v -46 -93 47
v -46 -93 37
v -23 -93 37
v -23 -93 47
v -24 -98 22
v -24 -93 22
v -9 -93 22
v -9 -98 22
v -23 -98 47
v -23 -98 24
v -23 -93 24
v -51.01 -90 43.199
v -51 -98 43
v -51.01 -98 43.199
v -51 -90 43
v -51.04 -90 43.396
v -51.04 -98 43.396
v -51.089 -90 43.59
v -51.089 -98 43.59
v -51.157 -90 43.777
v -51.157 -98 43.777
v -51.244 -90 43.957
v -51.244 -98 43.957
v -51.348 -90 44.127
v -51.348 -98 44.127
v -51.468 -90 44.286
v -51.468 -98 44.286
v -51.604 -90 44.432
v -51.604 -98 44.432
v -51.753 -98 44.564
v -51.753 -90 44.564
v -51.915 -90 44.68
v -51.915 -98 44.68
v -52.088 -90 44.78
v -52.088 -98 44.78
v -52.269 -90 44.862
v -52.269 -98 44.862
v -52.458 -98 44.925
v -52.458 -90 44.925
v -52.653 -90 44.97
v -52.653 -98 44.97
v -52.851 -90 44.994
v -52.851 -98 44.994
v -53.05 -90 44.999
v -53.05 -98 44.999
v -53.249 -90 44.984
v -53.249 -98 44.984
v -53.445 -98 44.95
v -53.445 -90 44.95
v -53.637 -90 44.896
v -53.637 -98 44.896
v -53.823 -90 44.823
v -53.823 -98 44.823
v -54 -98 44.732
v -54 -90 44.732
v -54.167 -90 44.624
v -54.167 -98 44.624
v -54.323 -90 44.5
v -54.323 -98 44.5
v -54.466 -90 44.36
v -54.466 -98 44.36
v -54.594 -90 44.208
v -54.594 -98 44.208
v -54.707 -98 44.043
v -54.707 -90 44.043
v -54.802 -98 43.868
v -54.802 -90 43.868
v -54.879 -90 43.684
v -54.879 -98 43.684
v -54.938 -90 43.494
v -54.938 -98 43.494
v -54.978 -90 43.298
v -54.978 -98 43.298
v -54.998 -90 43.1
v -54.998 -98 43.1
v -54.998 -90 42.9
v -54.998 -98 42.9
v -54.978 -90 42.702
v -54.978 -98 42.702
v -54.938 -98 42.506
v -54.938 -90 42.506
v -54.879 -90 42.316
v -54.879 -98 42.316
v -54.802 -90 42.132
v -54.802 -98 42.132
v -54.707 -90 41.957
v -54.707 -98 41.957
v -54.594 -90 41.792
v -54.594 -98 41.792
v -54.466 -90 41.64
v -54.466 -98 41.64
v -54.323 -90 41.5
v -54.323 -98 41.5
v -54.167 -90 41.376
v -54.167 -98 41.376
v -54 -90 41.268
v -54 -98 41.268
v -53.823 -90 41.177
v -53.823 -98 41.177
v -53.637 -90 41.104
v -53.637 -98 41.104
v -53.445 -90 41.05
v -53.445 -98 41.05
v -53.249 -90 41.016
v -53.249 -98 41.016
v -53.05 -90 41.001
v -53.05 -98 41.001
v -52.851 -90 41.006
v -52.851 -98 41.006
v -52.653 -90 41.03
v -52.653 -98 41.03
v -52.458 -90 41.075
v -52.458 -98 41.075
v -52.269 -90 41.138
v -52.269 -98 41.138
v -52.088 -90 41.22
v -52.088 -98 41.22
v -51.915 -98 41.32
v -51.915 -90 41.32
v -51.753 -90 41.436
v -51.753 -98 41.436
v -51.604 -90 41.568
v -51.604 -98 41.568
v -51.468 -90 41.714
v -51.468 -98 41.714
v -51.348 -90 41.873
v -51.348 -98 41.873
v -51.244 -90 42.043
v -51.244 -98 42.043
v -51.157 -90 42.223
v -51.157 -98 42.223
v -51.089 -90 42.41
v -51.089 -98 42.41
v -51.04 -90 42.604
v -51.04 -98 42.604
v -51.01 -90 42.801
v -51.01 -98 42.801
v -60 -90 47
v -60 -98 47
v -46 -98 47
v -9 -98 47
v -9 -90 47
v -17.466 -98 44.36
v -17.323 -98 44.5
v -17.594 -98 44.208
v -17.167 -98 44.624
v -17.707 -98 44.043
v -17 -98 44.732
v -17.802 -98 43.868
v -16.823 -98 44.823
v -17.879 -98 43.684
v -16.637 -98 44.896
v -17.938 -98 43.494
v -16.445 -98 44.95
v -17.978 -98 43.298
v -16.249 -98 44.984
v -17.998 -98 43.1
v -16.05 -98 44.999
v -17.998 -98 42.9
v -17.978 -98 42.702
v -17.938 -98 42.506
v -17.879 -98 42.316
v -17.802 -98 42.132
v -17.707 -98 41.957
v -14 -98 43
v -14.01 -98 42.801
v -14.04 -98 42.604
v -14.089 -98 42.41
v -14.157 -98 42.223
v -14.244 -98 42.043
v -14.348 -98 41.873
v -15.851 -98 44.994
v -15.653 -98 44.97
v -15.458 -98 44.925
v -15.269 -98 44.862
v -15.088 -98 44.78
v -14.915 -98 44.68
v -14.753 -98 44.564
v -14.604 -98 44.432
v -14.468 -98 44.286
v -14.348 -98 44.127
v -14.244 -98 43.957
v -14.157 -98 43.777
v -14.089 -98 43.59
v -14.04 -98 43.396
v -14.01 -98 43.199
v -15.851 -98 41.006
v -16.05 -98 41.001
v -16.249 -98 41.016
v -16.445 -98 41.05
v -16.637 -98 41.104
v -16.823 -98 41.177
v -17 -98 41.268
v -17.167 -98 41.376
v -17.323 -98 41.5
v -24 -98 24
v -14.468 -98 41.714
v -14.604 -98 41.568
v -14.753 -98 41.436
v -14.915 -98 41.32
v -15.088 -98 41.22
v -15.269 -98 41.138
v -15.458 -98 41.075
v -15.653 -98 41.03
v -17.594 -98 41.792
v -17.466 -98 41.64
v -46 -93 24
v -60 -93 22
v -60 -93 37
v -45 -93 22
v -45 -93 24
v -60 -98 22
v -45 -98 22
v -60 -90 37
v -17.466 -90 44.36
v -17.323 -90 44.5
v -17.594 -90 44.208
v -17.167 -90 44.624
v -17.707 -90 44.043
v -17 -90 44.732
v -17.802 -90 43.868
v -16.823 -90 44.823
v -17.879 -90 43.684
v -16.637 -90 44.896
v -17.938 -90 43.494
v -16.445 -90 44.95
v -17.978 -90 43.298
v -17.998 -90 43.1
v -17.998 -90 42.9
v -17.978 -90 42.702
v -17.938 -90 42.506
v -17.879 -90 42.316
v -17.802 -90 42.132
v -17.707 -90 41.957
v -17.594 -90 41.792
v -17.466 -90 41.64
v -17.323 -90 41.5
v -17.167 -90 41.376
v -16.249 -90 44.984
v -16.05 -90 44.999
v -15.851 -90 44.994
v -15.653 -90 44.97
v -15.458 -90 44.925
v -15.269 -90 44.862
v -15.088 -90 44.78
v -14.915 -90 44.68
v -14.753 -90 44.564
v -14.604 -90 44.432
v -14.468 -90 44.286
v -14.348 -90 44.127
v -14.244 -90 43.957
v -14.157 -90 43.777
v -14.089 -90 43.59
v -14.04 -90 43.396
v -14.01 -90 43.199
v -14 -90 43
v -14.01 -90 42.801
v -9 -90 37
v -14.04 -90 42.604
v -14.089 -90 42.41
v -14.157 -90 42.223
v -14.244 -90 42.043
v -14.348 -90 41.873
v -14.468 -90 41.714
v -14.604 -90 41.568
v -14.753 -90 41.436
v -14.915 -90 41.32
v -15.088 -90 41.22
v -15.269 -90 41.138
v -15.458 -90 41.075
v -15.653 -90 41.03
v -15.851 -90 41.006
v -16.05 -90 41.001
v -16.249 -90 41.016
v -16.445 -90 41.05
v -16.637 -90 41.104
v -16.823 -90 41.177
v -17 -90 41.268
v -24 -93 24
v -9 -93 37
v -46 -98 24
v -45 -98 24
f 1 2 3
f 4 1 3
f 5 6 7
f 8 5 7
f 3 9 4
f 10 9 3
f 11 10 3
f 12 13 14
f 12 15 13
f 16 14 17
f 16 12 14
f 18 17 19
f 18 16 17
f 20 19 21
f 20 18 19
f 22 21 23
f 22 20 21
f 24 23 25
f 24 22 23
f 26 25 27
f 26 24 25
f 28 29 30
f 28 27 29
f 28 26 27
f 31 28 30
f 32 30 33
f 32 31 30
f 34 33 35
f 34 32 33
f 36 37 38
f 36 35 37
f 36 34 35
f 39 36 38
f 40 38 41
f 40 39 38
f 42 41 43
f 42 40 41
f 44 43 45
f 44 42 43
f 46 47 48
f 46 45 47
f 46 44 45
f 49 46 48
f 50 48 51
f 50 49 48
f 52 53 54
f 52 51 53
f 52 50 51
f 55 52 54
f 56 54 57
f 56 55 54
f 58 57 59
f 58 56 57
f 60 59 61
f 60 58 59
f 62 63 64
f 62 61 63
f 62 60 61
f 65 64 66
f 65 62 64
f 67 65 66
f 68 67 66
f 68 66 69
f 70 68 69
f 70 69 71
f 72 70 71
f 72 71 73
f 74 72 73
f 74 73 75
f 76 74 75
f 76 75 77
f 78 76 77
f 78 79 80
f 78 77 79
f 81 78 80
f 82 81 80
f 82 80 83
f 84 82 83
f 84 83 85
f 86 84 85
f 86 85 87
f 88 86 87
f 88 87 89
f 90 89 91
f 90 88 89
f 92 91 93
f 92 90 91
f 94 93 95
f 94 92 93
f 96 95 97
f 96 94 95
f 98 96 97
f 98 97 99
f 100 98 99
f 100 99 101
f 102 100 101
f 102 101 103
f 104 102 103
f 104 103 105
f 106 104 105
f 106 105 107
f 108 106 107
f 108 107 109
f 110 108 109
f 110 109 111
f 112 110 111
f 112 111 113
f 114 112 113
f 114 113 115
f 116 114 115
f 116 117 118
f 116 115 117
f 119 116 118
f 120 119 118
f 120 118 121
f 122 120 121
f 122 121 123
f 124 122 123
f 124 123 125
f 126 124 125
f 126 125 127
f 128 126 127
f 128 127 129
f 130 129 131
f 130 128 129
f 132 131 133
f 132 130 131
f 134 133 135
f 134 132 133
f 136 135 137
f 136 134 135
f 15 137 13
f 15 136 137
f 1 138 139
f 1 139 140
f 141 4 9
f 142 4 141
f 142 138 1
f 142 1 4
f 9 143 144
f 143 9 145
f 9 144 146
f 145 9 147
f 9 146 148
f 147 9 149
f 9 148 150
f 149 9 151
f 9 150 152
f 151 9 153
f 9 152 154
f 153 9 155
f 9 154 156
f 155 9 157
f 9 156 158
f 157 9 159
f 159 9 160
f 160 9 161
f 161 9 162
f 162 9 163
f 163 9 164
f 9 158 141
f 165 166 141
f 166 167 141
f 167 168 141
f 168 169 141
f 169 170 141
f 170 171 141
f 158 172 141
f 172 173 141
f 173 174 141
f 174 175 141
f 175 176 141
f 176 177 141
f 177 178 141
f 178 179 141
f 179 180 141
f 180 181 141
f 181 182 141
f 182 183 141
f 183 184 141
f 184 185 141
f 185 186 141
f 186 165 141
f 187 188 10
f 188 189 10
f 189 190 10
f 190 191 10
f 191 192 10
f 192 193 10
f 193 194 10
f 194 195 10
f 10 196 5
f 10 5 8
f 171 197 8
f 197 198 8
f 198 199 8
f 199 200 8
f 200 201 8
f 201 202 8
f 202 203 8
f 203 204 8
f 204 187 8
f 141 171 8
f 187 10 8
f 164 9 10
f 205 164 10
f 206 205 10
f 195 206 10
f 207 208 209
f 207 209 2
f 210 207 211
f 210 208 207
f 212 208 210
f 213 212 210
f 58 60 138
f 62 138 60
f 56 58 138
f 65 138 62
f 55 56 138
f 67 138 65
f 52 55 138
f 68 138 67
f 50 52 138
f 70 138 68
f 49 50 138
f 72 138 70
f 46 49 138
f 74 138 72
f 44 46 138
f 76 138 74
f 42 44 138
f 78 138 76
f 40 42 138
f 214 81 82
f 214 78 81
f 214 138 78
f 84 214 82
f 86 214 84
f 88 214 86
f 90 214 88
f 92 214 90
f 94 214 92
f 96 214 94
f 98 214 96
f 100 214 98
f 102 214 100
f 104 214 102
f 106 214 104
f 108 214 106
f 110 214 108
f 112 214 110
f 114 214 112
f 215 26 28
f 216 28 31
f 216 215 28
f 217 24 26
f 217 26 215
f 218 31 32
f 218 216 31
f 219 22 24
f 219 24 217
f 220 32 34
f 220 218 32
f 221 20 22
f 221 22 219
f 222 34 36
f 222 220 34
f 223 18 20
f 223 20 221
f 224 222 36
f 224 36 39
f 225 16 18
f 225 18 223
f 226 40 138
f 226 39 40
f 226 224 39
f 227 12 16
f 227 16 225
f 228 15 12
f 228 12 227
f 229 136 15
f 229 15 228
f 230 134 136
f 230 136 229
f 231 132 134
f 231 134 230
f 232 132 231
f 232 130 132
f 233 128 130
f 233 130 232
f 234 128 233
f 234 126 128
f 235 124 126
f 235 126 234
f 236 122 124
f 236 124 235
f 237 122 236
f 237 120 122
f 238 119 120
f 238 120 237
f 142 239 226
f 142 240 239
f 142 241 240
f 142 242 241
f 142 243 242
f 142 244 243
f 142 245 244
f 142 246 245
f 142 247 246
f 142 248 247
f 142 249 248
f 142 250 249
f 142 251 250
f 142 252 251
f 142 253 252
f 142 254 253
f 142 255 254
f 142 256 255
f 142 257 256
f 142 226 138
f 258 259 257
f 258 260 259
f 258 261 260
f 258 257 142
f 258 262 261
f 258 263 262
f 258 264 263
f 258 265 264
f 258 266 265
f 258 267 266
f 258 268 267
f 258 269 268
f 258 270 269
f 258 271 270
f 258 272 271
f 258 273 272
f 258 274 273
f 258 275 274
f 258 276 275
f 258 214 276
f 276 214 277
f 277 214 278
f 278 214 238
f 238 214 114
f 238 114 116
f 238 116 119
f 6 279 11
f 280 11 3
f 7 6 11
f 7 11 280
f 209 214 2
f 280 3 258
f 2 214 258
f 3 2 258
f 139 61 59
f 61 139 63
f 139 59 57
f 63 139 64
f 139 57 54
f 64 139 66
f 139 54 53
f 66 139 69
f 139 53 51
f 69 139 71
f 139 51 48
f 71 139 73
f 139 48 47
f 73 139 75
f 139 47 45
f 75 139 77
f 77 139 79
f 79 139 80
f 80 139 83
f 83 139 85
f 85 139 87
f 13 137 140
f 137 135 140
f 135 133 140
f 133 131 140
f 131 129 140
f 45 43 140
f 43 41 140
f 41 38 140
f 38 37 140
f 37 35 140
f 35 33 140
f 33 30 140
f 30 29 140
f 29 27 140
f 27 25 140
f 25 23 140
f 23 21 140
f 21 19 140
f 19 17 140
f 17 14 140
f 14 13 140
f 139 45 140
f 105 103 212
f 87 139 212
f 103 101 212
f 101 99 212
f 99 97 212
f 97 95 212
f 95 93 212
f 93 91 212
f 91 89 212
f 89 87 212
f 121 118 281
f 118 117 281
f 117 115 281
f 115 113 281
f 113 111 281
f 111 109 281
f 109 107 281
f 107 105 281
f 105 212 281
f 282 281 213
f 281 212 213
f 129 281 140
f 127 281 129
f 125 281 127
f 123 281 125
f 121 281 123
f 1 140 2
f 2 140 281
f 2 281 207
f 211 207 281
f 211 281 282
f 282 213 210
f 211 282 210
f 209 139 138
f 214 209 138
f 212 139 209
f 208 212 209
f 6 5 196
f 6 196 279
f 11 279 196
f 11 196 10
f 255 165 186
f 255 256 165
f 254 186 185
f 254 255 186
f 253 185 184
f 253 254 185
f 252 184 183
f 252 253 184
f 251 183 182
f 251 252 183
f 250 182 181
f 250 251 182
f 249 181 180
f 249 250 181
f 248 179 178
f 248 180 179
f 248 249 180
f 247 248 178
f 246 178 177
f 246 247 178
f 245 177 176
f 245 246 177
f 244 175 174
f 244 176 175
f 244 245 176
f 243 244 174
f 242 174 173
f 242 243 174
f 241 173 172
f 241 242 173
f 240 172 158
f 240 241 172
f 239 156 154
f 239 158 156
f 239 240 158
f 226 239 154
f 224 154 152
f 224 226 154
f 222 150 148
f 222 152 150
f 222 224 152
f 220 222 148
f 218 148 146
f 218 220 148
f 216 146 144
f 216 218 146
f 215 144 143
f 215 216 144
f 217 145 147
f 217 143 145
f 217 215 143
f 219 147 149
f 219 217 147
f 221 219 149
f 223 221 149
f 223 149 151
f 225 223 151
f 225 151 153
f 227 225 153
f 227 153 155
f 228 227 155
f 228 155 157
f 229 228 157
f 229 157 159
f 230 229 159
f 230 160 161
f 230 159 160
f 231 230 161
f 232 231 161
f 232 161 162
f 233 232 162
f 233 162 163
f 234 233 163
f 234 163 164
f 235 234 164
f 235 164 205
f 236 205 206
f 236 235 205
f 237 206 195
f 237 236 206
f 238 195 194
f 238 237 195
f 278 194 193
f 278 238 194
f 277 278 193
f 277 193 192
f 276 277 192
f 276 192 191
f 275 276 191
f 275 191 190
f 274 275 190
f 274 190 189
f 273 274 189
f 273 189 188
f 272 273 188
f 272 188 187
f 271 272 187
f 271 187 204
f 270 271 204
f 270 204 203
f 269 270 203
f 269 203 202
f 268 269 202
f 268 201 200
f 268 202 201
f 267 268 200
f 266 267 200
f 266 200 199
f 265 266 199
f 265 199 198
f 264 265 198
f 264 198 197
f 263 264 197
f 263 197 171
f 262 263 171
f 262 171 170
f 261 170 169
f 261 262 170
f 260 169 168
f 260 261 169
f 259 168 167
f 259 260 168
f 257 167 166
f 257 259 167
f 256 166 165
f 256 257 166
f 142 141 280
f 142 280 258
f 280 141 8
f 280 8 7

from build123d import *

# Parameters (mm, degrees)
CYLINDER295_R     = 2
CYLINDER295_DEPTH = 20
CYLINDER294_R     = 2
CYLINDER294_DEPTH = 20
BOX385_W          = 2
BOX385_H          = 5
BOX385_DEPTH      = 2
BOX025_W          = 23
BOX025_H          = 5
BOX025_DEPTH      = 25
BOX026_W          = 51
BOX026_H          = 5
BOX026_DEPTH      = 10
BOX024_W          = 51
BOX024_H          = 5
BOX024_DEPTH      = 25
BOX384_W          = 2
BOX384_H          = 5
BOX384_DEPTH      = 2


with BuildPart() as cylinder295:
    # Cylinder295 → Cylinder295 (new body)
    with BuildSketch(Plane(origin=(-16, -88, 43), x_dir=(1, 0, 0), z_dir=(0, -1, 0))):
        Circle(CYLINDER295_R)
    extrude(amount=CYLINDER295_DEPTH)


with BuildPart() as fusion233:
    # Cylinder294 → Cylinder294 (new body)
    with BuildSketch(Plane(origin=(-53, -88, 43), x_dir=(1, 0, 0), z_dir=(0, -1, 0))):
        Circle(CYLINDER294_R)
    extrude(amount=CYLINDER294_DEPTH)

    # Fusion233: union Cylinder295
    add(cylinder295.part)


with BuildPart() as box385:
    # Box385 → Box385 (new body)
    with BuildSketch(Plane(origin=(-24, -93, 26), x_dir=(1, 0, 0), z_dir=(0, 0, 1))):
        with Locations((1, 2.5)):
            Rectangle(BOX385_W, BOX385_H)
    extrude(amount=BOX385_DEPTH)


with BuildPart() as box025:
    # Box025 → Box025 (new body)
    with BuildSketch(Plane(origin=(-37, -93, 16), x_dir=(1, 0, 0), z_dir=(0, 0, 1))):
        with Locations((11.5, 2.5)):
            Rectangle(BOX025_W, BOX025_H)
    extrude(amount=BOX025_DEPTH)


with BuildPart() as box026:
    # Box026 → Box026 (new body)
    with BuildSketch(Plane(origin=(-51, -90, 31), x_dir=(1, 0, 0), z_dir=(0, 0, 1))):
        with Locations((25.5, 2.5)):
            Rectangle(BOX026_W, BOX026_H)
    extrude(amount=BOX026_DEPTH)


with BuildPart() as cut268:
    # Box024 → Box024 (new body)
    with BuildSketch(Plane(origin=(-51, -93, 16), x_dir=(1, 0, 0), z_dir=(0, 0, 1))):
        with Locations((25.5, 2.5)):
            Rectangle(BOX024_W, BOX024_H)
    extrude(amount=BOX024_DEPTH)

    # Fusion223: union Box026
    add(box026.part)

    # Cut268: cut Box025
    add(box025.part, mode=Mode.SUBTRACT)


with BuildPart() as cut268_1:
    # Cut268 placement: moved
    add(cut268.part.moved(Location((-9, 0, 10))))


with BuildPart() as cut280:
    # Box384 → Box384 (new body)
    with BuildSketch(Plane(origin=(-47, -93, 26), x_dir=(1, 0, 0), z_dir=(0, 0, 1))):
        with Locations((1, 2.5)):
            Rectangle(BOX384_W, BOX384_H)
    extrude(amount=BOX384_DEPTH)

    # Fusion224: union Box385, Cut268
    add(box385.part)
    add(cut268_1.part)


with BuildPart() as cut280_1:
    # Fusion224 placement: moved
    add(cut280.part.moved(Location((0, -5, -4))))

    # Cut280: cut Fusion233
    add(fusion233.part, mode=Mode.SUBTRACT)


solid = cut280_1.part
